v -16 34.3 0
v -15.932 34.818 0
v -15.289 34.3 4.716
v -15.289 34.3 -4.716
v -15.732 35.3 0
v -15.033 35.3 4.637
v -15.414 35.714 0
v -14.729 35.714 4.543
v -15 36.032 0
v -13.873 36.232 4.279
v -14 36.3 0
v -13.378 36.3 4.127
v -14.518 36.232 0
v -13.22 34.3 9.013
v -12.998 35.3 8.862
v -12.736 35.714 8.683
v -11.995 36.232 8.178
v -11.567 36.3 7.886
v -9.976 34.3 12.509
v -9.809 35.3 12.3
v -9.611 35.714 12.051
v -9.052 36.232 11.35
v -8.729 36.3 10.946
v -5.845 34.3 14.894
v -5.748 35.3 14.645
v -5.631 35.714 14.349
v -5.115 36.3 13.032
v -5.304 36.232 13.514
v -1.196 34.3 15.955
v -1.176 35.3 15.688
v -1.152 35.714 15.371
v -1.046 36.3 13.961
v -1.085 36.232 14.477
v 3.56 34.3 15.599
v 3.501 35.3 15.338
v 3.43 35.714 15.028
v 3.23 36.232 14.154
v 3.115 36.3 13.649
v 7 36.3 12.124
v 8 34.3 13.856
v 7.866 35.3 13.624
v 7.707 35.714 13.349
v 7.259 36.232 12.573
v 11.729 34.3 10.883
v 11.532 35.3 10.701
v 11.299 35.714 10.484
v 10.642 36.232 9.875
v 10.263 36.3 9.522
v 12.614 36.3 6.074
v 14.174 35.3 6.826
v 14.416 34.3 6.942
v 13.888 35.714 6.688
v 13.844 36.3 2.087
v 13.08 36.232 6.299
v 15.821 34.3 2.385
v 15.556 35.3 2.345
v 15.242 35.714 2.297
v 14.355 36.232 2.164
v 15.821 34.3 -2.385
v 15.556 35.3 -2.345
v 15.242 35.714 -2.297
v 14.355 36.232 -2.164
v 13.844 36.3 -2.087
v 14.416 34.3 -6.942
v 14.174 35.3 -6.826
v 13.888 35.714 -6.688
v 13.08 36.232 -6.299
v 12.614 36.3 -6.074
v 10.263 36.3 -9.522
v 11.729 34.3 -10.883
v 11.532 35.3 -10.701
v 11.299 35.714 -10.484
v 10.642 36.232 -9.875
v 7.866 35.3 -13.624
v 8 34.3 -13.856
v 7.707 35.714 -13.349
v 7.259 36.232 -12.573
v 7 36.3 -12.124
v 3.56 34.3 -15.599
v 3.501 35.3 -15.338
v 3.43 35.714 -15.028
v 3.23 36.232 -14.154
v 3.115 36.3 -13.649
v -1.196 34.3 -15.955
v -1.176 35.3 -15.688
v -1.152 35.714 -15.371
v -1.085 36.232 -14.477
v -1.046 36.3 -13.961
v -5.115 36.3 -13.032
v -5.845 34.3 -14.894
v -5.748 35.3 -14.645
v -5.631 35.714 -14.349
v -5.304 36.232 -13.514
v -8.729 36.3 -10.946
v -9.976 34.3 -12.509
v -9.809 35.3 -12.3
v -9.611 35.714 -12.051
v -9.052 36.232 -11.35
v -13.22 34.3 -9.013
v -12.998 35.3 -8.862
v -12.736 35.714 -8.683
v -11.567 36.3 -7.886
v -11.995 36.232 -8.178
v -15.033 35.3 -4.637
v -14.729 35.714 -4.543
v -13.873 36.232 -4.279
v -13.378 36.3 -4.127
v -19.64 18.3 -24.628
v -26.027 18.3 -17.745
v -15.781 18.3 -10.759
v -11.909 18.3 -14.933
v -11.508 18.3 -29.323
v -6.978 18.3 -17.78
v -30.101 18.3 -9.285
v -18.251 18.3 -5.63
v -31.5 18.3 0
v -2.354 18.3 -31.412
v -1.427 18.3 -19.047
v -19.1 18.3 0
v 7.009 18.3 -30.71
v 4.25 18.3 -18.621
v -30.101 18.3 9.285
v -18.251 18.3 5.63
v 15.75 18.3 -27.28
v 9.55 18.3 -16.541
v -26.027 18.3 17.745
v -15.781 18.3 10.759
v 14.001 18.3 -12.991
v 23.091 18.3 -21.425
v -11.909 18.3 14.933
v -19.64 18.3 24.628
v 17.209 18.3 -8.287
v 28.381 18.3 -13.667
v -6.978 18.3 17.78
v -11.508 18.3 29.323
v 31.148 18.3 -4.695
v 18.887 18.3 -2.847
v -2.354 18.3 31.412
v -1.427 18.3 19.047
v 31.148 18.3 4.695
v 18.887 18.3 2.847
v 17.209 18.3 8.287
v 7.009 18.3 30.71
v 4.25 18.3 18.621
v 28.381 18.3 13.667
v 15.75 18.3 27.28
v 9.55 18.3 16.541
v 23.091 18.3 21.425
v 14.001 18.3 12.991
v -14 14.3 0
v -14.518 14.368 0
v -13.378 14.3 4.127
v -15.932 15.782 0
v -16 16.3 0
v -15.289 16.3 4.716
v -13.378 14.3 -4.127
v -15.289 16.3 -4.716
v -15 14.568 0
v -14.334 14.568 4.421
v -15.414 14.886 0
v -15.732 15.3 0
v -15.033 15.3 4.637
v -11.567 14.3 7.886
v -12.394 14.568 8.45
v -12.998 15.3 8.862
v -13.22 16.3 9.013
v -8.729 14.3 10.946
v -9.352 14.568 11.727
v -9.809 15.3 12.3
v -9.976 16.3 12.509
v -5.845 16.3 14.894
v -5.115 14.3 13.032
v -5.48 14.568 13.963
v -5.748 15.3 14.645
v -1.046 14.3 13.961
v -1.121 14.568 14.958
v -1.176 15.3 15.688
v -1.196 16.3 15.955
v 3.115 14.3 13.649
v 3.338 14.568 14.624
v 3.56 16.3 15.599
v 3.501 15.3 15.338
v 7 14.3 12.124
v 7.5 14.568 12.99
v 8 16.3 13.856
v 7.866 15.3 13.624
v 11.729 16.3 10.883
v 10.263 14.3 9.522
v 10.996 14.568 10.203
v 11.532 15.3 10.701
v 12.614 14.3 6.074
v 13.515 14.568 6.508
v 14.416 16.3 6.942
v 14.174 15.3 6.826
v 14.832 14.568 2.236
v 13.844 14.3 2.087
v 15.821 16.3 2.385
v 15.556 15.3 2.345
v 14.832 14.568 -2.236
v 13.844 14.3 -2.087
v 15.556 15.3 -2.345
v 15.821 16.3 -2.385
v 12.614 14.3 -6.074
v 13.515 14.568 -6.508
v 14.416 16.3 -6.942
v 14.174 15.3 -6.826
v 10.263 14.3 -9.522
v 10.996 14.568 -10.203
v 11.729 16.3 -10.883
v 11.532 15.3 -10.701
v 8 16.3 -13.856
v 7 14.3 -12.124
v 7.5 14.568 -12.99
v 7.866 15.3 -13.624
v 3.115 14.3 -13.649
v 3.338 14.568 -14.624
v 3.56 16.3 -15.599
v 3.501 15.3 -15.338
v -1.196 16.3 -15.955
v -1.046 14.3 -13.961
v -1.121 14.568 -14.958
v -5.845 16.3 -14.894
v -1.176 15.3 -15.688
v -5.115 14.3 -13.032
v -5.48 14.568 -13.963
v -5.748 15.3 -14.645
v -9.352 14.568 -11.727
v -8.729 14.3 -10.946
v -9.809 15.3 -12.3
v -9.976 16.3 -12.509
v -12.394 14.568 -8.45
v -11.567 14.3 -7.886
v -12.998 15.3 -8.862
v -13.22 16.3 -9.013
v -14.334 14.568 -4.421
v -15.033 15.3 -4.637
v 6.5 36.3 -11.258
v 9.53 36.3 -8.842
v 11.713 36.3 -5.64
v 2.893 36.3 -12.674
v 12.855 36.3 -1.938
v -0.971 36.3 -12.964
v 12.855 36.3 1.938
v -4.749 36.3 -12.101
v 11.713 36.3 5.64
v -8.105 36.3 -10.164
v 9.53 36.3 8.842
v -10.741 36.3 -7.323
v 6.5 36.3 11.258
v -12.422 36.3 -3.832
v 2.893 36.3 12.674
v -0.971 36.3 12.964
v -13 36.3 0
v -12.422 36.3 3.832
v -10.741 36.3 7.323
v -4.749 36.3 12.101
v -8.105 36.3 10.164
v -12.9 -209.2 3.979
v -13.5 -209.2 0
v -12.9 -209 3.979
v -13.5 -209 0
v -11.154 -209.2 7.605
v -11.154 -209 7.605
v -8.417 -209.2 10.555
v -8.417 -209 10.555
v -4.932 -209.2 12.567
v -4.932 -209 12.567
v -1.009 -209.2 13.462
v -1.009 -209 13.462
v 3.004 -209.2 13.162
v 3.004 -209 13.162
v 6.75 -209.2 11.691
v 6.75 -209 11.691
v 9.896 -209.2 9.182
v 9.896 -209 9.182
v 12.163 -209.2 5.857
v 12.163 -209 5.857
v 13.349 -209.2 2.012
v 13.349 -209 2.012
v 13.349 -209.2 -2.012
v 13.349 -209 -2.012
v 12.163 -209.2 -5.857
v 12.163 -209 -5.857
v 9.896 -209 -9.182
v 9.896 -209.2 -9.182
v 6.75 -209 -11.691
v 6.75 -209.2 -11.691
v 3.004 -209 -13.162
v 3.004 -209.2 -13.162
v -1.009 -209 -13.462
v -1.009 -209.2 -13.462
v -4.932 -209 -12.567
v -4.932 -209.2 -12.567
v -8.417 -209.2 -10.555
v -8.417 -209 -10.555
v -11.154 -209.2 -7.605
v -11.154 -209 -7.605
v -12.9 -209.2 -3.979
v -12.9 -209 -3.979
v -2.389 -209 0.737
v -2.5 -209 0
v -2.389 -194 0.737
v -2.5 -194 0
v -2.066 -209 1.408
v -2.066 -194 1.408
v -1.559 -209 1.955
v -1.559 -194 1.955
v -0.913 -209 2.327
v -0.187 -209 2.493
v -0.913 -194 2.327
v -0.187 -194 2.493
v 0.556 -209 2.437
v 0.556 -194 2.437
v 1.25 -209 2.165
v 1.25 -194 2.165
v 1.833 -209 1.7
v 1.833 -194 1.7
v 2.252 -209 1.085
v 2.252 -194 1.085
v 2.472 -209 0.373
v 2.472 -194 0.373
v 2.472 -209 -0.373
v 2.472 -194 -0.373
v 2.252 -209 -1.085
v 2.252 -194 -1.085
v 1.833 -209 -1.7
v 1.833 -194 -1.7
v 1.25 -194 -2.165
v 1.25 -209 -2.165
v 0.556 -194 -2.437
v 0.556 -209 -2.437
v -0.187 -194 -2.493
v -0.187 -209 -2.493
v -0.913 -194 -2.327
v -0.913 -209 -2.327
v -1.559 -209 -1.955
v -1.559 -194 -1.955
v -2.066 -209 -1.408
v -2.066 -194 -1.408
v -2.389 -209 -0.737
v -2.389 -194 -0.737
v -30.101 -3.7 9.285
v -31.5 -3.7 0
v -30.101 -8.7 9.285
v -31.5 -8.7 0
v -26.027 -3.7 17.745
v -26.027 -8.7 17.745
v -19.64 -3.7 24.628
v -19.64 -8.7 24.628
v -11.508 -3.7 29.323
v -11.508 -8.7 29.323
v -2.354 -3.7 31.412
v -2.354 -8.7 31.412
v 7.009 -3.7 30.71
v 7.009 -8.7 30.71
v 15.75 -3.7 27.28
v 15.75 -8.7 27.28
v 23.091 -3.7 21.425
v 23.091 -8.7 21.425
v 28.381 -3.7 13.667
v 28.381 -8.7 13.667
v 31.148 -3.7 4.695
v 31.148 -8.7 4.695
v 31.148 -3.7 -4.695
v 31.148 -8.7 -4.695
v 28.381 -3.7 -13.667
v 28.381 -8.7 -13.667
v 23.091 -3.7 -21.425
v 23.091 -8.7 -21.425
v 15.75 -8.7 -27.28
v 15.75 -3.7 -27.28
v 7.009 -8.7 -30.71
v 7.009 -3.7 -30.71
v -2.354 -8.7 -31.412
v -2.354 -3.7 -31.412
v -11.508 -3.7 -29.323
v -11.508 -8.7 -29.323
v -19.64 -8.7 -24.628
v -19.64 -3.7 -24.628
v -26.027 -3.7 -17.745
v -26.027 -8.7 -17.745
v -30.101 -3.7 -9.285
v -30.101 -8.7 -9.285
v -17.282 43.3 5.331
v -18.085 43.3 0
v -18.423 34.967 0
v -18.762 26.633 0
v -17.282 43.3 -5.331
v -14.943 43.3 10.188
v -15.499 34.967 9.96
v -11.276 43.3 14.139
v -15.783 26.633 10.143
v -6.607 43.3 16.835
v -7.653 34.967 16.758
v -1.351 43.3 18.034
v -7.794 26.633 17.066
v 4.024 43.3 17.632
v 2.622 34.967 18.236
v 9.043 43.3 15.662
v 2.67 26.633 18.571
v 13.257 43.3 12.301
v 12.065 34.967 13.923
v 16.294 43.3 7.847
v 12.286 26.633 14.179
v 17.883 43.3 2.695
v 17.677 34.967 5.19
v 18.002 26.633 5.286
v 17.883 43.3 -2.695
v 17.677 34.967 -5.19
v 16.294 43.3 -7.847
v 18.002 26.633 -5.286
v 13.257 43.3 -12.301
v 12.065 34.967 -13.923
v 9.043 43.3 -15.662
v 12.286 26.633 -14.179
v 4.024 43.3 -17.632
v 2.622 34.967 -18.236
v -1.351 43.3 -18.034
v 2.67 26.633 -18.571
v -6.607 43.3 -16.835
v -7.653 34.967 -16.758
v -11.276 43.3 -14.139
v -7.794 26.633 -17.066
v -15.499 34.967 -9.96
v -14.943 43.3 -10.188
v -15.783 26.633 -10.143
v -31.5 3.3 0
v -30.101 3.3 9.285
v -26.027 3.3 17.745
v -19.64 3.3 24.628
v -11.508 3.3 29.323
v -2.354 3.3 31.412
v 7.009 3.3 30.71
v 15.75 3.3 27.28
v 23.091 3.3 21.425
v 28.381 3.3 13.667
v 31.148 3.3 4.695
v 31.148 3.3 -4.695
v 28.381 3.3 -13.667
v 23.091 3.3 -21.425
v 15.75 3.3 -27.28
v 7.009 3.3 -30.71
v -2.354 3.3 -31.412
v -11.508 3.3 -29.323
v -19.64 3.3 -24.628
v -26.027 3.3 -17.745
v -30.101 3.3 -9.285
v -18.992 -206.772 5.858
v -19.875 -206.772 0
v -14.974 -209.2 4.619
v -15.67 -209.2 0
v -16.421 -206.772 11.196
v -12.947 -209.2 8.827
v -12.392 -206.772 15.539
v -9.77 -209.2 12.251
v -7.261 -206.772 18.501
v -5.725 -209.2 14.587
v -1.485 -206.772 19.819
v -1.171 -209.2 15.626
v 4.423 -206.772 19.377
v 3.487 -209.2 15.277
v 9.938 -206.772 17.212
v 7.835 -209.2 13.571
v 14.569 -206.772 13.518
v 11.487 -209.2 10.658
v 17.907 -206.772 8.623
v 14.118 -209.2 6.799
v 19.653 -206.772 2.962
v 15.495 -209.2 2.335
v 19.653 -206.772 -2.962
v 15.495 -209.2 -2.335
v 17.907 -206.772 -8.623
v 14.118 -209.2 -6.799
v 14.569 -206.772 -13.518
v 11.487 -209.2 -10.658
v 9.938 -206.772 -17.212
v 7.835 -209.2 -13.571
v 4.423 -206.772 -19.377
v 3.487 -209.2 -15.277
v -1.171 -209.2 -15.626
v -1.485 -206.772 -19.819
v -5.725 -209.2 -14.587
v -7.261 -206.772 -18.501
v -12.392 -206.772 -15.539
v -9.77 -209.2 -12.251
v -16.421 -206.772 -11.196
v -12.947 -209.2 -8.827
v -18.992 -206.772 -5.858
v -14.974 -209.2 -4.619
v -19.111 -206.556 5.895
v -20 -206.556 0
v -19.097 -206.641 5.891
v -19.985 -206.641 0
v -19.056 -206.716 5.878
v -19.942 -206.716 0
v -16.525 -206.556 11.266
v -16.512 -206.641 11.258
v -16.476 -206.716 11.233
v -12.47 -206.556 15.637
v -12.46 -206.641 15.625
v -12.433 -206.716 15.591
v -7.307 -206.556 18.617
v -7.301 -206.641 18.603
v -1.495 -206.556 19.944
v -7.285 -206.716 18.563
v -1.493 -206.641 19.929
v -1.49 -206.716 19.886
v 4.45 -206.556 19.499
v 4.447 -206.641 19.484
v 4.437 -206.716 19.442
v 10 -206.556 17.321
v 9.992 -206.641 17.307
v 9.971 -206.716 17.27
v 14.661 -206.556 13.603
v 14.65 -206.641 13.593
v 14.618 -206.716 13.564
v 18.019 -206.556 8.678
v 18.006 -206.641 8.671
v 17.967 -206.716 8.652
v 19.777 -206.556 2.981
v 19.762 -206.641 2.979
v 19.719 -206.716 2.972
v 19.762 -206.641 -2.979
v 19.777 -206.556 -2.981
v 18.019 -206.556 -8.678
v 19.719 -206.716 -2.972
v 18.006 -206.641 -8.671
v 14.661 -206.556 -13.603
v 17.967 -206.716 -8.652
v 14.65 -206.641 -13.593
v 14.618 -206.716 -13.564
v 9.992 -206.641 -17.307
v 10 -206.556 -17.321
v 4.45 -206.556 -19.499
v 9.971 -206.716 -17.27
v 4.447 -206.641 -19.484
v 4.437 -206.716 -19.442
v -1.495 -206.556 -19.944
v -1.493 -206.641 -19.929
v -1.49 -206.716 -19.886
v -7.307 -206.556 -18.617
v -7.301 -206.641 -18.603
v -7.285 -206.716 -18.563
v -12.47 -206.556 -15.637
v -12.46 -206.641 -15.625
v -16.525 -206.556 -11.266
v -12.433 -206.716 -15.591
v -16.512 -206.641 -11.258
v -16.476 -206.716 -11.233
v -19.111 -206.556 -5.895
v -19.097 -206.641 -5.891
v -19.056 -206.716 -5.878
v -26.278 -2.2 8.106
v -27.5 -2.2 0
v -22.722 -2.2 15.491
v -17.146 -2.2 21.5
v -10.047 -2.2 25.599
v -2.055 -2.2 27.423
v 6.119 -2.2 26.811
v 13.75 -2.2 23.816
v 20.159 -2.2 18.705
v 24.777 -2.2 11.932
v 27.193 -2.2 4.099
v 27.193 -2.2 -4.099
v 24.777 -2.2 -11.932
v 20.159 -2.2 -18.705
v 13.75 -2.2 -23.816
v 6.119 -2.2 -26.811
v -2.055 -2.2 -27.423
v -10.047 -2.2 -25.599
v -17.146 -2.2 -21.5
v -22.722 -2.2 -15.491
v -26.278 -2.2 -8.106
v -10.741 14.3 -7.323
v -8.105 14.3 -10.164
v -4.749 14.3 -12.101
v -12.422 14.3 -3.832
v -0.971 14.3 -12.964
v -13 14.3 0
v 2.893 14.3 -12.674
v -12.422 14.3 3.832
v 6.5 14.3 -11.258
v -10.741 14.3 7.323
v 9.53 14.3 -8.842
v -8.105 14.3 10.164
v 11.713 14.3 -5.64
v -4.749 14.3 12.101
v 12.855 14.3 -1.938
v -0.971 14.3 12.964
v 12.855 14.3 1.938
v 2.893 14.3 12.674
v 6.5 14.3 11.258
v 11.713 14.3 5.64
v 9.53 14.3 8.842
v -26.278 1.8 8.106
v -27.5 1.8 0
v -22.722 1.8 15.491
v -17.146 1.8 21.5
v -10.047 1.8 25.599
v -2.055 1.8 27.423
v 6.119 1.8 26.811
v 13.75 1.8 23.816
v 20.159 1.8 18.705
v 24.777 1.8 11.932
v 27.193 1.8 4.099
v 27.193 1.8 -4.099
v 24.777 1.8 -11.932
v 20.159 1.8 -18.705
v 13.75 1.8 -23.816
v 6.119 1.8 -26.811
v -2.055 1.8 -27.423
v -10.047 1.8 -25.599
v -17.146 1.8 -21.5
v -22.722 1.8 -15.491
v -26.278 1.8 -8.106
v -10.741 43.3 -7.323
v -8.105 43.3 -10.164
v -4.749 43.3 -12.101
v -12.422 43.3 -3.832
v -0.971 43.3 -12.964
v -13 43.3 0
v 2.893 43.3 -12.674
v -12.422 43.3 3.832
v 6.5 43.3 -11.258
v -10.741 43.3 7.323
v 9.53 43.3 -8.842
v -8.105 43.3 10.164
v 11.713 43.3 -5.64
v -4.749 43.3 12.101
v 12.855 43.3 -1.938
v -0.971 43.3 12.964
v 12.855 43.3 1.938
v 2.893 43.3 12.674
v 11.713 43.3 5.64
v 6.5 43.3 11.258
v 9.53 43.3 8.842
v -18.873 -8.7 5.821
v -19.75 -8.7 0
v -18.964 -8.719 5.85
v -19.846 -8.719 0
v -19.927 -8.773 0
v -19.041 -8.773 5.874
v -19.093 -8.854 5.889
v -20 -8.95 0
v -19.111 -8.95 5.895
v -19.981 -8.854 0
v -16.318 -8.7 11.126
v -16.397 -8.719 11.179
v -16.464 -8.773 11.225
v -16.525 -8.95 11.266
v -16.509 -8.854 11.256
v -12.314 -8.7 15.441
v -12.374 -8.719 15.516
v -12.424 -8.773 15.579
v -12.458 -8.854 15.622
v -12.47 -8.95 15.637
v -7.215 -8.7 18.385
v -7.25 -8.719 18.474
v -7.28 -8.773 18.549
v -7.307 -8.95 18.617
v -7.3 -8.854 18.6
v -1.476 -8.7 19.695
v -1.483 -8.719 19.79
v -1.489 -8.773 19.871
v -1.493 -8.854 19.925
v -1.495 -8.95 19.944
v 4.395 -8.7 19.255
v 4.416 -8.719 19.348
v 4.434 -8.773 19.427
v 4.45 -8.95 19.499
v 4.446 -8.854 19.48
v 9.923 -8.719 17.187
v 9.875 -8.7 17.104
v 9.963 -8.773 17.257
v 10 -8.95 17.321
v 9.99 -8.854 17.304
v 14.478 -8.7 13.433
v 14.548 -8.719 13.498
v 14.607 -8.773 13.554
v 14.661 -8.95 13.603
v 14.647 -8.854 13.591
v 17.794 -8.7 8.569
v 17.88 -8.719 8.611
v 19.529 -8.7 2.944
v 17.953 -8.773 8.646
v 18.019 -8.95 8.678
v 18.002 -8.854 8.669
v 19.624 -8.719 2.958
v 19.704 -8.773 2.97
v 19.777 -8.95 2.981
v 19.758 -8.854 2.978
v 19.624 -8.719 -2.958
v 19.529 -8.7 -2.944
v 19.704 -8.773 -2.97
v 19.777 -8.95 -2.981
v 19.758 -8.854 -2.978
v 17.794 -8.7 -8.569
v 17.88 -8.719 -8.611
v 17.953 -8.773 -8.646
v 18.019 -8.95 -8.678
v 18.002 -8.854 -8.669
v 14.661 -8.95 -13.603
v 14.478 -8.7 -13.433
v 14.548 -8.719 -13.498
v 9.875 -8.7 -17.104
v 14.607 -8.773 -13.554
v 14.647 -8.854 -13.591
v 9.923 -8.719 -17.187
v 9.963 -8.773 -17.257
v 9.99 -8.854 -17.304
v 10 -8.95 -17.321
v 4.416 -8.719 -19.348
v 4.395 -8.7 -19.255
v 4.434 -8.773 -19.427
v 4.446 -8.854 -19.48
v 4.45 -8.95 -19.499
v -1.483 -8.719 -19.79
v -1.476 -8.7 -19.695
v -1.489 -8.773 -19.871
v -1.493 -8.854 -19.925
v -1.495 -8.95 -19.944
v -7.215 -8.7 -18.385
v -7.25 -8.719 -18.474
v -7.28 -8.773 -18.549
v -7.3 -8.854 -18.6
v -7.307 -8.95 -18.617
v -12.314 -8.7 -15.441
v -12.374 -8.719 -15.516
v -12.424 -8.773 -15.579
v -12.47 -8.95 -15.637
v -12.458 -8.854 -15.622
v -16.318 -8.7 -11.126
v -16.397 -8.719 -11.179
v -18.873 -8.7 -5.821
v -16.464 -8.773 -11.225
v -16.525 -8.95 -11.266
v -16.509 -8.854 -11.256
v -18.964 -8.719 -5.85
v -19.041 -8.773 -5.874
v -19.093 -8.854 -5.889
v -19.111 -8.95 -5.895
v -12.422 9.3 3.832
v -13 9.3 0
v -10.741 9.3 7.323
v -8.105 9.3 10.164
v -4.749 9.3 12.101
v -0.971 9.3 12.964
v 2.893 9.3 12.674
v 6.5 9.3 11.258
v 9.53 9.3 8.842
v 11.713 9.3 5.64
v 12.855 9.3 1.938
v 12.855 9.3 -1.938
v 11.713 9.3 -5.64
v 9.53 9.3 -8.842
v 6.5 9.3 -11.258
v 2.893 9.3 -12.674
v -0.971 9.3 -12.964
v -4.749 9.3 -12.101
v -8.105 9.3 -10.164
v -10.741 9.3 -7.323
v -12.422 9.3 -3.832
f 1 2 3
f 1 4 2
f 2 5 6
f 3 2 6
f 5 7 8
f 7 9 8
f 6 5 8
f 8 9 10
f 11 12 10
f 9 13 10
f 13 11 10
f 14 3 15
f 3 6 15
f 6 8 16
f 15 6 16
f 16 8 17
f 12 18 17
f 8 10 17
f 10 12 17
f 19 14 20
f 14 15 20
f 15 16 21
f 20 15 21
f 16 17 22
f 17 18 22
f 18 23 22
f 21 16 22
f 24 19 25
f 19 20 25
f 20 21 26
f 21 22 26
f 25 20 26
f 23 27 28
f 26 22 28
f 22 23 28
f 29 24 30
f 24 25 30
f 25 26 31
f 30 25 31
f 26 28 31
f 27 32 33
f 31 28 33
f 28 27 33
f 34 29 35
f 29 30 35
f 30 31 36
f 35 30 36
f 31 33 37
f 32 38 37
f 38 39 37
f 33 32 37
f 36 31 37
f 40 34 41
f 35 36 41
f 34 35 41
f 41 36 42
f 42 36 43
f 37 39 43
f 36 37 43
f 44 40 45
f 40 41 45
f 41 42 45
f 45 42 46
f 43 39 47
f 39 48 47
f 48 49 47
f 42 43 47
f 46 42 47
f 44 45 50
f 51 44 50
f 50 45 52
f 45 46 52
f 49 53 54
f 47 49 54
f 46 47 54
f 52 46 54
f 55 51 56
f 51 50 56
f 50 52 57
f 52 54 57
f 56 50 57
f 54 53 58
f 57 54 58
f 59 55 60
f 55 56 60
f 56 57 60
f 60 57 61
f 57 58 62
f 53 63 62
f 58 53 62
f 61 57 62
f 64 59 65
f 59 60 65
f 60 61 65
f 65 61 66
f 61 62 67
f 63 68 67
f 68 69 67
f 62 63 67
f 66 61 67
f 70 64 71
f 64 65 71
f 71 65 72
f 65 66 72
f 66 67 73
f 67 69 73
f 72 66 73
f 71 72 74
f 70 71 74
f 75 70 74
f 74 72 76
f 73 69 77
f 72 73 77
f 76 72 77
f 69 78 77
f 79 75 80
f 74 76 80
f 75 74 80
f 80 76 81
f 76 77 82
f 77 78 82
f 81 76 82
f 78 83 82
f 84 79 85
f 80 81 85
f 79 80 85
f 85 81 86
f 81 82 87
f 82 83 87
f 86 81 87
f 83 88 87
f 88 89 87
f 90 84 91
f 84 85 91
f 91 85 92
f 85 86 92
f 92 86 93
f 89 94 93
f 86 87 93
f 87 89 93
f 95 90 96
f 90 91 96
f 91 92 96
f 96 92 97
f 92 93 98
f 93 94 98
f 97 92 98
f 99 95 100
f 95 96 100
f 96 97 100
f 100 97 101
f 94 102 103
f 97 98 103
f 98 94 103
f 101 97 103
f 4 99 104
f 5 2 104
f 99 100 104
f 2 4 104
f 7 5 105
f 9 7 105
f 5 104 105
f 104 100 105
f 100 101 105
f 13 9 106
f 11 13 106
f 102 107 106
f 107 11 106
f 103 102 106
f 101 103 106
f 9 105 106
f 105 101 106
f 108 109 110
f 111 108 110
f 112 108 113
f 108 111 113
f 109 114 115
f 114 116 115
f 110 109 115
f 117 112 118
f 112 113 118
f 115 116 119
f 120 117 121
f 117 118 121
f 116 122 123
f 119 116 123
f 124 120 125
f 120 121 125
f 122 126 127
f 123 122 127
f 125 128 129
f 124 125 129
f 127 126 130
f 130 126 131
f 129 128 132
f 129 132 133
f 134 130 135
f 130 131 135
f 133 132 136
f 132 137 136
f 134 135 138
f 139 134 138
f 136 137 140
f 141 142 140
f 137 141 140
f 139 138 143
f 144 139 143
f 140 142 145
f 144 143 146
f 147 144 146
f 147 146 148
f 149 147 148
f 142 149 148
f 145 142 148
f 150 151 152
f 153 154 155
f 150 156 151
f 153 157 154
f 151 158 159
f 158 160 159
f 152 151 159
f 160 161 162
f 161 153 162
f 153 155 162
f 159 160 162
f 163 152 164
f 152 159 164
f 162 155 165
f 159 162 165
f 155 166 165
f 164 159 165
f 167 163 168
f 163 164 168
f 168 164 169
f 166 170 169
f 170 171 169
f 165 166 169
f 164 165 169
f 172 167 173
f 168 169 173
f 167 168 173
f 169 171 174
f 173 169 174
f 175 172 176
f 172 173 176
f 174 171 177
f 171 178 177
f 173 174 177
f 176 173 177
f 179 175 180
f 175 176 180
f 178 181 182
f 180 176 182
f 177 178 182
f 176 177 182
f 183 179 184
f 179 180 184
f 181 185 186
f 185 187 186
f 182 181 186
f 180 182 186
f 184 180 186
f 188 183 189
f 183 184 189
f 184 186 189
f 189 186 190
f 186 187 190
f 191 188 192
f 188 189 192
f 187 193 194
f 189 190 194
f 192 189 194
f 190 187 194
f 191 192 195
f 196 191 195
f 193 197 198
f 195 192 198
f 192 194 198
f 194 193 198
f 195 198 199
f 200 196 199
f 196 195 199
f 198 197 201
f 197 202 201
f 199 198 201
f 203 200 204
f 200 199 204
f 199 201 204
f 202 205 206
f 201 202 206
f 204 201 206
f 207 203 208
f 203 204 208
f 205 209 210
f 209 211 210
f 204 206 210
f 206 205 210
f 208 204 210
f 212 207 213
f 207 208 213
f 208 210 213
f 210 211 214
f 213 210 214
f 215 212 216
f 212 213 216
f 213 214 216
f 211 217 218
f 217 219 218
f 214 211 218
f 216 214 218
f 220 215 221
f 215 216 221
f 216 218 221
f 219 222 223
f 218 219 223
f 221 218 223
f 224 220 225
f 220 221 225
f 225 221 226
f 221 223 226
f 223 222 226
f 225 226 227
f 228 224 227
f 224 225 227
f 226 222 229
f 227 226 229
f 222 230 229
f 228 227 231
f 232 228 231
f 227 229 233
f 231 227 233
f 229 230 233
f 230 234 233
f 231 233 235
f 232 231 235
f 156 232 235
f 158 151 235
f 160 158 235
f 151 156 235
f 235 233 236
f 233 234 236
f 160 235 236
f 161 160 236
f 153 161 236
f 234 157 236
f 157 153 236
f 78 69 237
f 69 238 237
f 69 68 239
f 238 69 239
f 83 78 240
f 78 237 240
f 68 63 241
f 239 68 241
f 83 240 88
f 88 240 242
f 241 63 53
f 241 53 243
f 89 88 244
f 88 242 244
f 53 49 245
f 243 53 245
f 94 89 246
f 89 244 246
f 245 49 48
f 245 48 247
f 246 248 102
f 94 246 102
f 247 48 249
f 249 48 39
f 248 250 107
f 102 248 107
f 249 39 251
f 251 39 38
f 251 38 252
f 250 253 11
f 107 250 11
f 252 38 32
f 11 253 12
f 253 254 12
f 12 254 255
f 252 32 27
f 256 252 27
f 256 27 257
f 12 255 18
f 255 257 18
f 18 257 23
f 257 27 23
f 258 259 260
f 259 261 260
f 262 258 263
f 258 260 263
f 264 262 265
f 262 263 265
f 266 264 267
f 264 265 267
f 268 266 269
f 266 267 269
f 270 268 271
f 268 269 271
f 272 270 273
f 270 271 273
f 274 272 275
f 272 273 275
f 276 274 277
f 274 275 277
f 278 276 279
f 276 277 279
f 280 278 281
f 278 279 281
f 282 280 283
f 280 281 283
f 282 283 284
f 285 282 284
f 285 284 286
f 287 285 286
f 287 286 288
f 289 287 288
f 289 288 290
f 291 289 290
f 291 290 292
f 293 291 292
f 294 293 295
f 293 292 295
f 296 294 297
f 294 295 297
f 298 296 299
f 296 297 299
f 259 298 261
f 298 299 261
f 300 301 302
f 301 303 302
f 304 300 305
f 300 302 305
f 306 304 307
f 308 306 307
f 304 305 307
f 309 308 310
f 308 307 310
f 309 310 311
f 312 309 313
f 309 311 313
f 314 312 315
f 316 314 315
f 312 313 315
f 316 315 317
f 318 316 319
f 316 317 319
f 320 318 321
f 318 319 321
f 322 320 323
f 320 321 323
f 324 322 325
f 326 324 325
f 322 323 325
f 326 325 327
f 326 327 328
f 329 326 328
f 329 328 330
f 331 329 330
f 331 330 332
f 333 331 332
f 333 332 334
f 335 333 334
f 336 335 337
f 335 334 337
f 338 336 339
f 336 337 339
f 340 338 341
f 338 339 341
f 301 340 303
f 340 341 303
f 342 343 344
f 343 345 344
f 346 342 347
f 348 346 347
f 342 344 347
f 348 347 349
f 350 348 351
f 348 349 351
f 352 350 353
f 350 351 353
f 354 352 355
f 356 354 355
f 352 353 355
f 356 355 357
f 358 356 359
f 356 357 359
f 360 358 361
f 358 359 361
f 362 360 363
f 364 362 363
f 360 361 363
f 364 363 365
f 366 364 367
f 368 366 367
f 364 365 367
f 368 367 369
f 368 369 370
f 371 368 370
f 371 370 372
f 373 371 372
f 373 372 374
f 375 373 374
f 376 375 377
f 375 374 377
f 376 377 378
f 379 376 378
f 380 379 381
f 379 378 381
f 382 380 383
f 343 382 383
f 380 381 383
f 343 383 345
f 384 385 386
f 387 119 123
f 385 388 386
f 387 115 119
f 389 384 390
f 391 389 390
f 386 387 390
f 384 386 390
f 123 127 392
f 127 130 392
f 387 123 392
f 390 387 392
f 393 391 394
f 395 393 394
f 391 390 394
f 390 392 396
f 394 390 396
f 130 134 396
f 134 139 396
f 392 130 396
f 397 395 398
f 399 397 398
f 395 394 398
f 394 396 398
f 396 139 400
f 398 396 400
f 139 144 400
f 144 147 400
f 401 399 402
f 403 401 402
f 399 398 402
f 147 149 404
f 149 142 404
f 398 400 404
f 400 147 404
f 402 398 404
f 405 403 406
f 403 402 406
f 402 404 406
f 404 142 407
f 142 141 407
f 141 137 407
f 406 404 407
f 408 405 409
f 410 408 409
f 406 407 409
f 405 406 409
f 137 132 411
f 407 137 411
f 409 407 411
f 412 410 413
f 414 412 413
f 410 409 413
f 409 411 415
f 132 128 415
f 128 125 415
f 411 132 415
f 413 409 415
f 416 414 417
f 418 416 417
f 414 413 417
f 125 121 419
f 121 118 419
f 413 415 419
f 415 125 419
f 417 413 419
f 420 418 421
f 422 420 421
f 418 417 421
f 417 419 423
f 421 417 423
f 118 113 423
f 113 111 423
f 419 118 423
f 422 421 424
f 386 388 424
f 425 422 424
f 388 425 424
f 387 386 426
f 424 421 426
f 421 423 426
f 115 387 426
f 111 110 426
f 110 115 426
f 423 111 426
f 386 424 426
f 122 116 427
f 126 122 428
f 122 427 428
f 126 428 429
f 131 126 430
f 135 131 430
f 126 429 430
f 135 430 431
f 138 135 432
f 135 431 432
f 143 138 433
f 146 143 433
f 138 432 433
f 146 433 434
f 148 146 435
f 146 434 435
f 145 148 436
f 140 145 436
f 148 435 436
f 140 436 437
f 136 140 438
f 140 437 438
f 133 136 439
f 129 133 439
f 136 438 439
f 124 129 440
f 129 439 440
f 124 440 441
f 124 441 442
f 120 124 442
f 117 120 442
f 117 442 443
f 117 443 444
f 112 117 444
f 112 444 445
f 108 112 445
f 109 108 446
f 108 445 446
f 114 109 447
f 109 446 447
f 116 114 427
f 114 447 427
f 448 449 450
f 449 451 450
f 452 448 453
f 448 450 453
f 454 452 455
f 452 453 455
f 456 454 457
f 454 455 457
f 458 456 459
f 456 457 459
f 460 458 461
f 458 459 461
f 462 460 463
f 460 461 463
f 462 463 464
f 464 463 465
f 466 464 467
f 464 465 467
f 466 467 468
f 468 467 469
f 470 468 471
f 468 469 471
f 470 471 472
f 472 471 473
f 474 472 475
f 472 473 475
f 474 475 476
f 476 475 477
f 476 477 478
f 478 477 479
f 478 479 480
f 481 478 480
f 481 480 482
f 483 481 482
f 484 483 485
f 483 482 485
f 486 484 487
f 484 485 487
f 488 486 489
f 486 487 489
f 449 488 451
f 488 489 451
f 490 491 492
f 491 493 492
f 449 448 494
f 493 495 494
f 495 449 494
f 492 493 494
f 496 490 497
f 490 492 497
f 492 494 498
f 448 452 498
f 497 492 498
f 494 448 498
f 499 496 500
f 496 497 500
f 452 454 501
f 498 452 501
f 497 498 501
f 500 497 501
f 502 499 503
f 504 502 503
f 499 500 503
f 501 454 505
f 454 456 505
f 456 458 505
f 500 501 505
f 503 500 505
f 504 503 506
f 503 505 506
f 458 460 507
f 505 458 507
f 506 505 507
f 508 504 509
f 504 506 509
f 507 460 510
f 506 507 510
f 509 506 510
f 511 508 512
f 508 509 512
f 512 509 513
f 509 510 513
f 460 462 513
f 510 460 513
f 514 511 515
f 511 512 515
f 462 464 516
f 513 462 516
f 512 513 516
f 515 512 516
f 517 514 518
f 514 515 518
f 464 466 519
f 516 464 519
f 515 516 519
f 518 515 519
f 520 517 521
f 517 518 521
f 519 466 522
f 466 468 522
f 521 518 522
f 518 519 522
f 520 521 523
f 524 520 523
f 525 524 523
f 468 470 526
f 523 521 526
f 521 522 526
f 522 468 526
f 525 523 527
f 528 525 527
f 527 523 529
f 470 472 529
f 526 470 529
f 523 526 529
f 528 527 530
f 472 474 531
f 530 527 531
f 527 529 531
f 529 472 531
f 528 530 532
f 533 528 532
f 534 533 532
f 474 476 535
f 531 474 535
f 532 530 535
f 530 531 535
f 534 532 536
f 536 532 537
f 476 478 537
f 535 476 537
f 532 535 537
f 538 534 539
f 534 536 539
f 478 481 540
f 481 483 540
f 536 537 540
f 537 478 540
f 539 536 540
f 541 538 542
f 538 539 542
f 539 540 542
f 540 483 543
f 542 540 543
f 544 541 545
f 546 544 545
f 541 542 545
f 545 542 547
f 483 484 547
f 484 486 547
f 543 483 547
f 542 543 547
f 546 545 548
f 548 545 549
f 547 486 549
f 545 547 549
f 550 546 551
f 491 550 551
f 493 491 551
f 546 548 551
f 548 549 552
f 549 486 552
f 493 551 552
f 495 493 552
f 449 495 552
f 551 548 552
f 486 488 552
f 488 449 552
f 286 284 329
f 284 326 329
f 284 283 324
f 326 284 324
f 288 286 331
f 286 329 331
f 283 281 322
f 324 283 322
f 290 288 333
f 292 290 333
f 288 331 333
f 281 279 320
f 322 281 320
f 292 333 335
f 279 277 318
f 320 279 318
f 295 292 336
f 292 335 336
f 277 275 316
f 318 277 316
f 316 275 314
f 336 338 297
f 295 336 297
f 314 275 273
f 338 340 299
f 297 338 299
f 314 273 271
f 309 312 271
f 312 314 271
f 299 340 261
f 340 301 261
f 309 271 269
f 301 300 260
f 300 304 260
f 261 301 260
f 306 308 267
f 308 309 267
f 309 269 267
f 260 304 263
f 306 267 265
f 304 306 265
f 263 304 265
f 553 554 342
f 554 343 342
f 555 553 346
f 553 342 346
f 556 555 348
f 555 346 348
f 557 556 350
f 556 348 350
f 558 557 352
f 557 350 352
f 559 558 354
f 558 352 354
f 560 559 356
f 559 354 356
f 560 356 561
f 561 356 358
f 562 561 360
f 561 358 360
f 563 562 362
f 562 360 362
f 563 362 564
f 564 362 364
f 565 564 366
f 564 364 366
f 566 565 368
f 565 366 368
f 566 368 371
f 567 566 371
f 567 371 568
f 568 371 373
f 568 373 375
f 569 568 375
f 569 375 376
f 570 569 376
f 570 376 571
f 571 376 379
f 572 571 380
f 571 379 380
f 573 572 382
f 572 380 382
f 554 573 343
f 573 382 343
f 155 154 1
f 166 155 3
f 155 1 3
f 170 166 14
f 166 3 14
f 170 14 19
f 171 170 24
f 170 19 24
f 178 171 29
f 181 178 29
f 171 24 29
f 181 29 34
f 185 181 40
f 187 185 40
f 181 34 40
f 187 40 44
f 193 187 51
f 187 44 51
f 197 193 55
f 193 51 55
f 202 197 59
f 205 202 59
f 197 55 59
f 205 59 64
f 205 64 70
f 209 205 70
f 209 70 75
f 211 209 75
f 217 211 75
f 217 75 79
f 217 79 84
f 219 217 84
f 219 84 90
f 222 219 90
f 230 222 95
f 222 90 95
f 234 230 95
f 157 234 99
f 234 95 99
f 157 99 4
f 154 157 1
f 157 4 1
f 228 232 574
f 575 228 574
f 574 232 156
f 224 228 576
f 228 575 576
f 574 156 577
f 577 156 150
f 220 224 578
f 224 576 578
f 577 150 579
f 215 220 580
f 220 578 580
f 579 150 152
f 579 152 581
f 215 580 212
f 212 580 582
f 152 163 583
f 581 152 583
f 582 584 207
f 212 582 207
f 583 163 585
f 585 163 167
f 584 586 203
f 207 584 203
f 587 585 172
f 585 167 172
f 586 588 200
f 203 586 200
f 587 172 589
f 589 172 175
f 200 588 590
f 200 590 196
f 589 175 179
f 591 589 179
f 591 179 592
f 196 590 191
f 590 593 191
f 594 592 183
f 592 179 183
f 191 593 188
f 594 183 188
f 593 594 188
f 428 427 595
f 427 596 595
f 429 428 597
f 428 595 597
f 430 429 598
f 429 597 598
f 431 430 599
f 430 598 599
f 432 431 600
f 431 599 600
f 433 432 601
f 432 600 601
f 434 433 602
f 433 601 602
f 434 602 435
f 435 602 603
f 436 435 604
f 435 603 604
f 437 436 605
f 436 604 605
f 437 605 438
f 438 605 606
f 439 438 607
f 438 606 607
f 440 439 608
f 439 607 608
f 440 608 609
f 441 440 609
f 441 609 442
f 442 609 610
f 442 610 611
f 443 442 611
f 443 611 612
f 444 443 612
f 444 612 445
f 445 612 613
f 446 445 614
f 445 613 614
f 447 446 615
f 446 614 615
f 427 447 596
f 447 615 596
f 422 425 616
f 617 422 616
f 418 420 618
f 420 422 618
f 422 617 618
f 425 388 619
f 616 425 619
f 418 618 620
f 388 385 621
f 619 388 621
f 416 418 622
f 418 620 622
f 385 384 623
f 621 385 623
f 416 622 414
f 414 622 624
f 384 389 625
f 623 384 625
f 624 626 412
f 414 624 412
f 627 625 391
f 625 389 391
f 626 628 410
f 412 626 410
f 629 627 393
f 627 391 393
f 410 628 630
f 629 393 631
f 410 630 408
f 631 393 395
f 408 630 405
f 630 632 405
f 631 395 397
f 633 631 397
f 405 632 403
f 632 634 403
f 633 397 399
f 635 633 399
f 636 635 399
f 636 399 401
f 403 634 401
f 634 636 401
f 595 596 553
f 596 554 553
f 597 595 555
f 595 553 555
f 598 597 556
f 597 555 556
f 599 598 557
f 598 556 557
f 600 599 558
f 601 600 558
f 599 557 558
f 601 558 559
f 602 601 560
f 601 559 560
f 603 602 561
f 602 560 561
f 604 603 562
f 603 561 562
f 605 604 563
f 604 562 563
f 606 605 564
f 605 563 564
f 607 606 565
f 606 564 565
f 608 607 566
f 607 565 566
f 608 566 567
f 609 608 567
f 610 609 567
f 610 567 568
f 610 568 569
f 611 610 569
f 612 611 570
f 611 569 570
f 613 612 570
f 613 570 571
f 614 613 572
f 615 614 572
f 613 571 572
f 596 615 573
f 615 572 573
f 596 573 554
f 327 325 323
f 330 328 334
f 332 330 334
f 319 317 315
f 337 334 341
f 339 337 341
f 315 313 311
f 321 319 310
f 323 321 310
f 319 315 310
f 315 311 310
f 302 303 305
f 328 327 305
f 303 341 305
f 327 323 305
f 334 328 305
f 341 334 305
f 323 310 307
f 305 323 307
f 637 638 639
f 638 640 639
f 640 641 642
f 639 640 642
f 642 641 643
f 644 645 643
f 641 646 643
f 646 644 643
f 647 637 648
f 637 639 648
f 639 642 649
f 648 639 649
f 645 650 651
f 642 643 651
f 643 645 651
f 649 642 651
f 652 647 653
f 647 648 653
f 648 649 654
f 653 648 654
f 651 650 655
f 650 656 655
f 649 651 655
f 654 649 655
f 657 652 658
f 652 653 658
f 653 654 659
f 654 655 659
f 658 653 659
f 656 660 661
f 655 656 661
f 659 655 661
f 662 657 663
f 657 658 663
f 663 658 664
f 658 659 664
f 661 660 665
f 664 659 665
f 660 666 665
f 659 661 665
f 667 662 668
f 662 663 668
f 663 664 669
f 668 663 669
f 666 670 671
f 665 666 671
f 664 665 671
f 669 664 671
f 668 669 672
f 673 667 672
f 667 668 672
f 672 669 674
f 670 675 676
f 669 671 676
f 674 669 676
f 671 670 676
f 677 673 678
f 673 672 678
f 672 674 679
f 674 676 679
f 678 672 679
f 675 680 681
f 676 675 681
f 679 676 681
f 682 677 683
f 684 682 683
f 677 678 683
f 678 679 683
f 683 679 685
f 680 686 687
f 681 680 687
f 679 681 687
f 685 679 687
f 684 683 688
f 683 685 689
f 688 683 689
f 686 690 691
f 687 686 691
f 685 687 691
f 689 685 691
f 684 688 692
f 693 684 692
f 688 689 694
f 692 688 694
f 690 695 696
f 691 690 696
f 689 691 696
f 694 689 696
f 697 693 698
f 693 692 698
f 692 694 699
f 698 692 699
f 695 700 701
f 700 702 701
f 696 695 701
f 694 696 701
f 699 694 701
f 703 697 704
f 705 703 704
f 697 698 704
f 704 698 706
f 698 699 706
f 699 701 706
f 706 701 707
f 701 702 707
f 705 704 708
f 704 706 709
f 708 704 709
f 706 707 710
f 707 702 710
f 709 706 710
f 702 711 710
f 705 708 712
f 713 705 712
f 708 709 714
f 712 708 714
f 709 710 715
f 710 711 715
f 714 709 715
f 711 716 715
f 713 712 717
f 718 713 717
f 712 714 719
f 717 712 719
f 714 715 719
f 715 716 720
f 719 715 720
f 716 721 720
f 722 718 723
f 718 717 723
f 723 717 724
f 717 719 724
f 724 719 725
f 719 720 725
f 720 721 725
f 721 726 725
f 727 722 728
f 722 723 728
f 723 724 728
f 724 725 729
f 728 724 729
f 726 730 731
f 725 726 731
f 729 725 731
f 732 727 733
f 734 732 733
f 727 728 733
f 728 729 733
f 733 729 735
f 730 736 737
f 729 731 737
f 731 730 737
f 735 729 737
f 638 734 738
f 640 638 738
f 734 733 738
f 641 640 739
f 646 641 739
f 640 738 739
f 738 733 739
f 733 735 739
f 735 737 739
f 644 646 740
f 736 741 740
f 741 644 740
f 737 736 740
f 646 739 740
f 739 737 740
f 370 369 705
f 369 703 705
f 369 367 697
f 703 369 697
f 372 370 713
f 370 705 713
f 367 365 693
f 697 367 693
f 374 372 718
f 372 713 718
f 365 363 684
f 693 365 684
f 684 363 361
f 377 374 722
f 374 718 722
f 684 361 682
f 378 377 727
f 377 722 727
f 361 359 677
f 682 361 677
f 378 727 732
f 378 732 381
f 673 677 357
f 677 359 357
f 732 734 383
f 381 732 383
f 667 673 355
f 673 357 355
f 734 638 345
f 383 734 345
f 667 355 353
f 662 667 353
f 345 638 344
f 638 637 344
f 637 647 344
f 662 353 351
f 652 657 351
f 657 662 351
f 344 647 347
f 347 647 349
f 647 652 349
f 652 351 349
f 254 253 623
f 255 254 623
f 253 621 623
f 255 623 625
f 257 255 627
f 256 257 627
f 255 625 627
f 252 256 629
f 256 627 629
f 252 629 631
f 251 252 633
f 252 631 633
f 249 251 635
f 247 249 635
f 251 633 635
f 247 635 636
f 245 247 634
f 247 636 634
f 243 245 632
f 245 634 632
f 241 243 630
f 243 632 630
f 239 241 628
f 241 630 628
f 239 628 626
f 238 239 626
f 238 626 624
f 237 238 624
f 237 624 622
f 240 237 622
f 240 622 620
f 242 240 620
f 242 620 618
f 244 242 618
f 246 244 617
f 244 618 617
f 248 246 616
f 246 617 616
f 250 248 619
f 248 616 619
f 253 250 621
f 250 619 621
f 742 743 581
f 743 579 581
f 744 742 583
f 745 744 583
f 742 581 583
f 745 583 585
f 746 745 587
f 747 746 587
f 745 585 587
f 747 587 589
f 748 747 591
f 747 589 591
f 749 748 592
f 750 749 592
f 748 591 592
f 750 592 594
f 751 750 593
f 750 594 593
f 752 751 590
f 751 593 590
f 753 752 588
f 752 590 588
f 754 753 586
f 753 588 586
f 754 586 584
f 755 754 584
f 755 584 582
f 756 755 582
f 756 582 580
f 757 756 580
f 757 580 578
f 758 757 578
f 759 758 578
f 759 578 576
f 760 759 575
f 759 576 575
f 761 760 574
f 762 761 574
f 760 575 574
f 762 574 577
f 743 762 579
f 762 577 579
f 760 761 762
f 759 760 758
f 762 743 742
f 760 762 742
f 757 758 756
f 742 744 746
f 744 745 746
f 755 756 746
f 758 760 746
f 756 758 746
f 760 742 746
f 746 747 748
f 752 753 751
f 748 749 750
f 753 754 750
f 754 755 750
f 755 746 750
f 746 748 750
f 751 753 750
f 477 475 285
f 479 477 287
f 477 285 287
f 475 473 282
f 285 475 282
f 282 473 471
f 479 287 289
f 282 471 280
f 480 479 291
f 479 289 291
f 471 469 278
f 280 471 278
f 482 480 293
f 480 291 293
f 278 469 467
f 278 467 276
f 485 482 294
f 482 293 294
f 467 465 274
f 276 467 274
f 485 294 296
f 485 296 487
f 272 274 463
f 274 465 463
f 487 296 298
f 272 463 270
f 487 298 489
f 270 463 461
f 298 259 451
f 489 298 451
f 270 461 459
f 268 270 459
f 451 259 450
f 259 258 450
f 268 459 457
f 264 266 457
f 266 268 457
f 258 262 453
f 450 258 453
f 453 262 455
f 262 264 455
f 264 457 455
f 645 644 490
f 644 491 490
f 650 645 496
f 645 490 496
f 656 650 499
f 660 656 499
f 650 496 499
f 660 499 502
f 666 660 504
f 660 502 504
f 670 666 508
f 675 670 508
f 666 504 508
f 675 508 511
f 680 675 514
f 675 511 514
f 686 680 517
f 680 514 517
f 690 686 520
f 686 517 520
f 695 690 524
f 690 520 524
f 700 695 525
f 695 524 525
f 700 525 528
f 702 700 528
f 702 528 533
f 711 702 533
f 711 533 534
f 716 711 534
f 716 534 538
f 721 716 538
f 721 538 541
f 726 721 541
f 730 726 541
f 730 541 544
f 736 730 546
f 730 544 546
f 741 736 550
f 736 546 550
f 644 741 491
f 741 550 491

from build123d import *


with BuildPart() as part:
    # Sketch1 → Rivoluzione1 (revolve)
    with BuildSketch(Plane.XY):
        with BuildLine():
            Line((-13, 252.3), (-18.085, 252.3))
            Line((-18.085, 252.3), (-19.1, 227.3))
            Line((-19.1, 227.3), (-31.5, 227.3))
            Line((-31.5, 227.3), (-31.5, 212.3))
            Line((-31.5, 212.3), (-27.5, 210.8))
            Line((-27.5, 210.8), (-27.5, 206.8))
            Line((-27.5, 206.8), (-31.5, 205.3))
            Line((-31.5, 205.3), (-31.5, 200.3))
            Line((-31.5, 200.3), (-20, 200.3))
            Line((-20, 200.3), (-19.75, 200.3))
            ThreePointArc((-19.75, 200.3), (-19.926776695, 200.226776695), (-20, 200.05))
            Line((-20, 200.05), (-20, 2.444337567))
            ThreePointArc((-20, 2.444337567), (-19.966506351, 2.319337567), (-19.875, 2.227831216))
            Line((-19.875, 2.227831216), (-15.669872981, -0.2))
            Line((-15.669872981, -0.2), (-13.5, -0.2))
            Line((-13.5, -0.2), (-13.5, 0))
            Line((-13.5, 0), (-2.5, 0))
            Line((-2.5, 0), (-2.5, 15))
            Line((-2.5, 15), (0, 15))
            Line((0, 15), (0, 218.3))
            Line((0, 218.3), (-13, 218.3))
            Line((-13, 218.3), (-13, 223.3))
            Line((-13, 223.3), (-14, 223.3))
            ThreePointArc((-14, 223.3), (-15.414213562, 223.885786438), (-16, 225.3))
            Line((-16, 225.3), (-16, 243.3))
            ThreePointArc((-16, 243.3), (-15.414213562, 244.714213562), (-14, 245.3))
            Line((-14, 245.3), (-13, 245.3))
            Line((-13, 245.3), (-13, 252.3))
        make_face()
    revolve(axis=Axis((0, 0, 0), (0, 1, 0)))


with BuildPart() as part_1:
    # Corpo-Sposta/copia1: moved
    add(part.part.moved(Location((0, -209, 0))))


solid = part_1.part
